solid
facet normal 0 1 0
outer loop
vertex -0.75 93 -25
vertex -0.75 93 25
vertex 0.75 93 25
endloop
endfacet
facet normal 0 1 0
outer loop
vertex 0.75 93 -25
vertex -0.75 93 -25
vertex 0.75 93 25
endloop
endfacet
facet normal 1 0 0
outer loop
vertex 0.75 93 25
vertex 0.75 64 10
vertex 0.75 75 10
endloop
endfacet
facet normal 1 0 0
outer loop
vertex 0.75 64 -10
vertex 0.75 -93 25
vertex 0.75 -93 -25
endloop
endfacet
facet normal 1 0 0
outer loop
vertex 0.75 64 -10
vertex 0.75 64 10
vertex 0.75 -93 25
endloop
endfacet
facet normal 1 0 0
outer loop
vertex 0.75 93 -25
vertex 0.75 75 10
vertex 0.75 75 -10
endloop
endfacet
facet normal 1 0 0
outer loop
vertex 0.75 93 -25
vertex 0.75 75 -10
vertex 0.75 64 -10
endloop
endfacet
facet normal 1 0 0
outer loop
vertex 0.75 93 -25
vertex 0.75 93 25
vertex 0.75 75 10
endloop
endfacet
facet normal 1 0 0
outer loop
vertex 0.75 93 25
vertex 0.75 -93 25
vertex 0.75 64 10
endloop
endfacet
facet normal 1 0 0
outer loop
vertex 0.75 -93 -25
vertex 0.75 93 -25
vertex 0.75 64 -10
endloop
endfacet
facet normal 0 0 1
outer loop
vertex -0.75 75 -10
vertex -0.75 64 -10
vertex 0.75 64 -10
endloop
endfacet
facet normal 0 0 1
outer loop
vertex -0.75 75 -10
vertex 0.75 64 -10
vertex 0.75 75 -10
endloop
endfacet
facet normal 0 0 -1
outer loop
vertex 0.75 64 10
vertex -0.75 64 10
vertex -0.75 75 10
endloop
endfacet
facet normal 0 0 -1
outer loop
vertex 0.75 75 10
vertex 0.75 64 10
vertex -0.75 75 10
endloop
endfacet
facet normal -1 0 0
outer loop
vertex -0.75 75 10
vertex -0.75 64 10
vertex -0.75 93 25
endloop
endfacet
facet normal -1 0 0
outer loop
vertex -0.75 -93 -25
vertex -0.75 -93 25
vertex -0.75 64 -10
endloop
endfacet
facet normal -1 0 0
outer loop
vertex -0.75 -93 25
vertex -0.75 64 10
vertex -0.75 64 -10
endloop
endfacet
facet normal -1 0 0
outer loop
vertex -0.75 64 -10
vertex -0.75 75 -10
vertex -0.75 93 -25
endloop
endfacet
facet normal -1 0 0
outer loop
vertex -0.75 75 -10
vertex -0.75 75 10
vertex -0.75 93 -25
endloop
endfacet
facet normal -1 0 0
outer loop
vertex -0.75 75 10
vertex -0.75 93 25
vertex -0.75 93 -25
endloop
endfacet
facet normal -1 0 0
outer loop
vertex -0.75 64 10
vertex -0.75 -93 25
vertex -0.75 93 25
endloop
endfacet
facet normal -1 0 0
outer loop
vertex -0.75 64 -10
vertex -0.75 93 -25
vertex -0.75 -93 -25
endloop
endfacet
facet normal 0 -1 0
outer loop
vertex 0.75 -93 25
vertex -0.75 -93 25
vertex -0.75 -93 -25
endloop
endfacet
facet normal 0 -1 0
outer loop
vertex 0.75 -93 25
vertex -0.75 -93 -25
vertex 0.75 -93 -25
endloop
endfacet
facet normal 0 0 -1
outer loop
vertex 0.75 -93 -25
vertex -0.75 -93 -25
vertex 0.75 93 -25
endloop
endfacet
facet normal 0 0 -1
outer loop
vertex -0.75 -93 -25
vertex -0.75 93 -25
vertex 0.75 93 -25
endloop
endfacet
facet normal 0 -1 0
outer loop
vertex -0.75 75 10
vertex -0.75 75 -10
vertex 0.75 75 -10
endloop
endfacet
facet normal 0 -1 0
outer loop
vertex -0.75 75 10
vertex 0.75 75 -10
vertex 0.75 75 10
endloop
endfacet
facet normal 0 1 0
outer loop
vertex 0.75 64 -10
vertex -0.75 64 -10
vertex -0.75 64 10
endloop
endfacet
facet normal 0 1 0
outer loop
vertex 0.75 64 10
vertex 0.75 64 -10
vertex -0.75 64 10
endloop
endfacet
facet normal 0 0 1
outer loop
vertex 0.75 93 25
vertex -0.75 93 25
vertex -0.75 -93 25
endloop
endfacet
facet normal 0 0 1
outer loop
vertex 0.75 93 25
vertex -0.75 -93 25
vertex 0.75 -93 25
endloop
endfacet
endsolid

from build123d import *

# Parameters (mm, degrees)
SKETCH1_W           = 1.5
SKETCH1_H           = 50
BOSS_EXTRUDE1_DEPTH = 93
SKETCH3_W           = 20
SKETCH3_H           = 11
SWITCH_DEPTH        = 2.5


with BuildPart() as part:
    # Sketch1 → Boss-Extrude1 (new body, symmetric)
    with BuildSketch(Plane(origin=(0, 0, 0), x_dir=(1, 0, 0), z_dir=(0, 1, 0))):
        Rectangle(SKETCH1_W, SKETCH1_H)
    extrude(amount=BOSS_EXTRUDE1_DEPTH, both=True)

    # Sketch3 → Switch (cut, through all)
    with BuildSketch(Plane.ZY.offset(0.75)):
        with Locations((0, 69.5)):
            Rectangle(SKETCH3_W, SKETCH3_H)
    extrude(amount=-SWITCH_DEPTH, mode=Mode.SUBTRACT)


solid = part.part
